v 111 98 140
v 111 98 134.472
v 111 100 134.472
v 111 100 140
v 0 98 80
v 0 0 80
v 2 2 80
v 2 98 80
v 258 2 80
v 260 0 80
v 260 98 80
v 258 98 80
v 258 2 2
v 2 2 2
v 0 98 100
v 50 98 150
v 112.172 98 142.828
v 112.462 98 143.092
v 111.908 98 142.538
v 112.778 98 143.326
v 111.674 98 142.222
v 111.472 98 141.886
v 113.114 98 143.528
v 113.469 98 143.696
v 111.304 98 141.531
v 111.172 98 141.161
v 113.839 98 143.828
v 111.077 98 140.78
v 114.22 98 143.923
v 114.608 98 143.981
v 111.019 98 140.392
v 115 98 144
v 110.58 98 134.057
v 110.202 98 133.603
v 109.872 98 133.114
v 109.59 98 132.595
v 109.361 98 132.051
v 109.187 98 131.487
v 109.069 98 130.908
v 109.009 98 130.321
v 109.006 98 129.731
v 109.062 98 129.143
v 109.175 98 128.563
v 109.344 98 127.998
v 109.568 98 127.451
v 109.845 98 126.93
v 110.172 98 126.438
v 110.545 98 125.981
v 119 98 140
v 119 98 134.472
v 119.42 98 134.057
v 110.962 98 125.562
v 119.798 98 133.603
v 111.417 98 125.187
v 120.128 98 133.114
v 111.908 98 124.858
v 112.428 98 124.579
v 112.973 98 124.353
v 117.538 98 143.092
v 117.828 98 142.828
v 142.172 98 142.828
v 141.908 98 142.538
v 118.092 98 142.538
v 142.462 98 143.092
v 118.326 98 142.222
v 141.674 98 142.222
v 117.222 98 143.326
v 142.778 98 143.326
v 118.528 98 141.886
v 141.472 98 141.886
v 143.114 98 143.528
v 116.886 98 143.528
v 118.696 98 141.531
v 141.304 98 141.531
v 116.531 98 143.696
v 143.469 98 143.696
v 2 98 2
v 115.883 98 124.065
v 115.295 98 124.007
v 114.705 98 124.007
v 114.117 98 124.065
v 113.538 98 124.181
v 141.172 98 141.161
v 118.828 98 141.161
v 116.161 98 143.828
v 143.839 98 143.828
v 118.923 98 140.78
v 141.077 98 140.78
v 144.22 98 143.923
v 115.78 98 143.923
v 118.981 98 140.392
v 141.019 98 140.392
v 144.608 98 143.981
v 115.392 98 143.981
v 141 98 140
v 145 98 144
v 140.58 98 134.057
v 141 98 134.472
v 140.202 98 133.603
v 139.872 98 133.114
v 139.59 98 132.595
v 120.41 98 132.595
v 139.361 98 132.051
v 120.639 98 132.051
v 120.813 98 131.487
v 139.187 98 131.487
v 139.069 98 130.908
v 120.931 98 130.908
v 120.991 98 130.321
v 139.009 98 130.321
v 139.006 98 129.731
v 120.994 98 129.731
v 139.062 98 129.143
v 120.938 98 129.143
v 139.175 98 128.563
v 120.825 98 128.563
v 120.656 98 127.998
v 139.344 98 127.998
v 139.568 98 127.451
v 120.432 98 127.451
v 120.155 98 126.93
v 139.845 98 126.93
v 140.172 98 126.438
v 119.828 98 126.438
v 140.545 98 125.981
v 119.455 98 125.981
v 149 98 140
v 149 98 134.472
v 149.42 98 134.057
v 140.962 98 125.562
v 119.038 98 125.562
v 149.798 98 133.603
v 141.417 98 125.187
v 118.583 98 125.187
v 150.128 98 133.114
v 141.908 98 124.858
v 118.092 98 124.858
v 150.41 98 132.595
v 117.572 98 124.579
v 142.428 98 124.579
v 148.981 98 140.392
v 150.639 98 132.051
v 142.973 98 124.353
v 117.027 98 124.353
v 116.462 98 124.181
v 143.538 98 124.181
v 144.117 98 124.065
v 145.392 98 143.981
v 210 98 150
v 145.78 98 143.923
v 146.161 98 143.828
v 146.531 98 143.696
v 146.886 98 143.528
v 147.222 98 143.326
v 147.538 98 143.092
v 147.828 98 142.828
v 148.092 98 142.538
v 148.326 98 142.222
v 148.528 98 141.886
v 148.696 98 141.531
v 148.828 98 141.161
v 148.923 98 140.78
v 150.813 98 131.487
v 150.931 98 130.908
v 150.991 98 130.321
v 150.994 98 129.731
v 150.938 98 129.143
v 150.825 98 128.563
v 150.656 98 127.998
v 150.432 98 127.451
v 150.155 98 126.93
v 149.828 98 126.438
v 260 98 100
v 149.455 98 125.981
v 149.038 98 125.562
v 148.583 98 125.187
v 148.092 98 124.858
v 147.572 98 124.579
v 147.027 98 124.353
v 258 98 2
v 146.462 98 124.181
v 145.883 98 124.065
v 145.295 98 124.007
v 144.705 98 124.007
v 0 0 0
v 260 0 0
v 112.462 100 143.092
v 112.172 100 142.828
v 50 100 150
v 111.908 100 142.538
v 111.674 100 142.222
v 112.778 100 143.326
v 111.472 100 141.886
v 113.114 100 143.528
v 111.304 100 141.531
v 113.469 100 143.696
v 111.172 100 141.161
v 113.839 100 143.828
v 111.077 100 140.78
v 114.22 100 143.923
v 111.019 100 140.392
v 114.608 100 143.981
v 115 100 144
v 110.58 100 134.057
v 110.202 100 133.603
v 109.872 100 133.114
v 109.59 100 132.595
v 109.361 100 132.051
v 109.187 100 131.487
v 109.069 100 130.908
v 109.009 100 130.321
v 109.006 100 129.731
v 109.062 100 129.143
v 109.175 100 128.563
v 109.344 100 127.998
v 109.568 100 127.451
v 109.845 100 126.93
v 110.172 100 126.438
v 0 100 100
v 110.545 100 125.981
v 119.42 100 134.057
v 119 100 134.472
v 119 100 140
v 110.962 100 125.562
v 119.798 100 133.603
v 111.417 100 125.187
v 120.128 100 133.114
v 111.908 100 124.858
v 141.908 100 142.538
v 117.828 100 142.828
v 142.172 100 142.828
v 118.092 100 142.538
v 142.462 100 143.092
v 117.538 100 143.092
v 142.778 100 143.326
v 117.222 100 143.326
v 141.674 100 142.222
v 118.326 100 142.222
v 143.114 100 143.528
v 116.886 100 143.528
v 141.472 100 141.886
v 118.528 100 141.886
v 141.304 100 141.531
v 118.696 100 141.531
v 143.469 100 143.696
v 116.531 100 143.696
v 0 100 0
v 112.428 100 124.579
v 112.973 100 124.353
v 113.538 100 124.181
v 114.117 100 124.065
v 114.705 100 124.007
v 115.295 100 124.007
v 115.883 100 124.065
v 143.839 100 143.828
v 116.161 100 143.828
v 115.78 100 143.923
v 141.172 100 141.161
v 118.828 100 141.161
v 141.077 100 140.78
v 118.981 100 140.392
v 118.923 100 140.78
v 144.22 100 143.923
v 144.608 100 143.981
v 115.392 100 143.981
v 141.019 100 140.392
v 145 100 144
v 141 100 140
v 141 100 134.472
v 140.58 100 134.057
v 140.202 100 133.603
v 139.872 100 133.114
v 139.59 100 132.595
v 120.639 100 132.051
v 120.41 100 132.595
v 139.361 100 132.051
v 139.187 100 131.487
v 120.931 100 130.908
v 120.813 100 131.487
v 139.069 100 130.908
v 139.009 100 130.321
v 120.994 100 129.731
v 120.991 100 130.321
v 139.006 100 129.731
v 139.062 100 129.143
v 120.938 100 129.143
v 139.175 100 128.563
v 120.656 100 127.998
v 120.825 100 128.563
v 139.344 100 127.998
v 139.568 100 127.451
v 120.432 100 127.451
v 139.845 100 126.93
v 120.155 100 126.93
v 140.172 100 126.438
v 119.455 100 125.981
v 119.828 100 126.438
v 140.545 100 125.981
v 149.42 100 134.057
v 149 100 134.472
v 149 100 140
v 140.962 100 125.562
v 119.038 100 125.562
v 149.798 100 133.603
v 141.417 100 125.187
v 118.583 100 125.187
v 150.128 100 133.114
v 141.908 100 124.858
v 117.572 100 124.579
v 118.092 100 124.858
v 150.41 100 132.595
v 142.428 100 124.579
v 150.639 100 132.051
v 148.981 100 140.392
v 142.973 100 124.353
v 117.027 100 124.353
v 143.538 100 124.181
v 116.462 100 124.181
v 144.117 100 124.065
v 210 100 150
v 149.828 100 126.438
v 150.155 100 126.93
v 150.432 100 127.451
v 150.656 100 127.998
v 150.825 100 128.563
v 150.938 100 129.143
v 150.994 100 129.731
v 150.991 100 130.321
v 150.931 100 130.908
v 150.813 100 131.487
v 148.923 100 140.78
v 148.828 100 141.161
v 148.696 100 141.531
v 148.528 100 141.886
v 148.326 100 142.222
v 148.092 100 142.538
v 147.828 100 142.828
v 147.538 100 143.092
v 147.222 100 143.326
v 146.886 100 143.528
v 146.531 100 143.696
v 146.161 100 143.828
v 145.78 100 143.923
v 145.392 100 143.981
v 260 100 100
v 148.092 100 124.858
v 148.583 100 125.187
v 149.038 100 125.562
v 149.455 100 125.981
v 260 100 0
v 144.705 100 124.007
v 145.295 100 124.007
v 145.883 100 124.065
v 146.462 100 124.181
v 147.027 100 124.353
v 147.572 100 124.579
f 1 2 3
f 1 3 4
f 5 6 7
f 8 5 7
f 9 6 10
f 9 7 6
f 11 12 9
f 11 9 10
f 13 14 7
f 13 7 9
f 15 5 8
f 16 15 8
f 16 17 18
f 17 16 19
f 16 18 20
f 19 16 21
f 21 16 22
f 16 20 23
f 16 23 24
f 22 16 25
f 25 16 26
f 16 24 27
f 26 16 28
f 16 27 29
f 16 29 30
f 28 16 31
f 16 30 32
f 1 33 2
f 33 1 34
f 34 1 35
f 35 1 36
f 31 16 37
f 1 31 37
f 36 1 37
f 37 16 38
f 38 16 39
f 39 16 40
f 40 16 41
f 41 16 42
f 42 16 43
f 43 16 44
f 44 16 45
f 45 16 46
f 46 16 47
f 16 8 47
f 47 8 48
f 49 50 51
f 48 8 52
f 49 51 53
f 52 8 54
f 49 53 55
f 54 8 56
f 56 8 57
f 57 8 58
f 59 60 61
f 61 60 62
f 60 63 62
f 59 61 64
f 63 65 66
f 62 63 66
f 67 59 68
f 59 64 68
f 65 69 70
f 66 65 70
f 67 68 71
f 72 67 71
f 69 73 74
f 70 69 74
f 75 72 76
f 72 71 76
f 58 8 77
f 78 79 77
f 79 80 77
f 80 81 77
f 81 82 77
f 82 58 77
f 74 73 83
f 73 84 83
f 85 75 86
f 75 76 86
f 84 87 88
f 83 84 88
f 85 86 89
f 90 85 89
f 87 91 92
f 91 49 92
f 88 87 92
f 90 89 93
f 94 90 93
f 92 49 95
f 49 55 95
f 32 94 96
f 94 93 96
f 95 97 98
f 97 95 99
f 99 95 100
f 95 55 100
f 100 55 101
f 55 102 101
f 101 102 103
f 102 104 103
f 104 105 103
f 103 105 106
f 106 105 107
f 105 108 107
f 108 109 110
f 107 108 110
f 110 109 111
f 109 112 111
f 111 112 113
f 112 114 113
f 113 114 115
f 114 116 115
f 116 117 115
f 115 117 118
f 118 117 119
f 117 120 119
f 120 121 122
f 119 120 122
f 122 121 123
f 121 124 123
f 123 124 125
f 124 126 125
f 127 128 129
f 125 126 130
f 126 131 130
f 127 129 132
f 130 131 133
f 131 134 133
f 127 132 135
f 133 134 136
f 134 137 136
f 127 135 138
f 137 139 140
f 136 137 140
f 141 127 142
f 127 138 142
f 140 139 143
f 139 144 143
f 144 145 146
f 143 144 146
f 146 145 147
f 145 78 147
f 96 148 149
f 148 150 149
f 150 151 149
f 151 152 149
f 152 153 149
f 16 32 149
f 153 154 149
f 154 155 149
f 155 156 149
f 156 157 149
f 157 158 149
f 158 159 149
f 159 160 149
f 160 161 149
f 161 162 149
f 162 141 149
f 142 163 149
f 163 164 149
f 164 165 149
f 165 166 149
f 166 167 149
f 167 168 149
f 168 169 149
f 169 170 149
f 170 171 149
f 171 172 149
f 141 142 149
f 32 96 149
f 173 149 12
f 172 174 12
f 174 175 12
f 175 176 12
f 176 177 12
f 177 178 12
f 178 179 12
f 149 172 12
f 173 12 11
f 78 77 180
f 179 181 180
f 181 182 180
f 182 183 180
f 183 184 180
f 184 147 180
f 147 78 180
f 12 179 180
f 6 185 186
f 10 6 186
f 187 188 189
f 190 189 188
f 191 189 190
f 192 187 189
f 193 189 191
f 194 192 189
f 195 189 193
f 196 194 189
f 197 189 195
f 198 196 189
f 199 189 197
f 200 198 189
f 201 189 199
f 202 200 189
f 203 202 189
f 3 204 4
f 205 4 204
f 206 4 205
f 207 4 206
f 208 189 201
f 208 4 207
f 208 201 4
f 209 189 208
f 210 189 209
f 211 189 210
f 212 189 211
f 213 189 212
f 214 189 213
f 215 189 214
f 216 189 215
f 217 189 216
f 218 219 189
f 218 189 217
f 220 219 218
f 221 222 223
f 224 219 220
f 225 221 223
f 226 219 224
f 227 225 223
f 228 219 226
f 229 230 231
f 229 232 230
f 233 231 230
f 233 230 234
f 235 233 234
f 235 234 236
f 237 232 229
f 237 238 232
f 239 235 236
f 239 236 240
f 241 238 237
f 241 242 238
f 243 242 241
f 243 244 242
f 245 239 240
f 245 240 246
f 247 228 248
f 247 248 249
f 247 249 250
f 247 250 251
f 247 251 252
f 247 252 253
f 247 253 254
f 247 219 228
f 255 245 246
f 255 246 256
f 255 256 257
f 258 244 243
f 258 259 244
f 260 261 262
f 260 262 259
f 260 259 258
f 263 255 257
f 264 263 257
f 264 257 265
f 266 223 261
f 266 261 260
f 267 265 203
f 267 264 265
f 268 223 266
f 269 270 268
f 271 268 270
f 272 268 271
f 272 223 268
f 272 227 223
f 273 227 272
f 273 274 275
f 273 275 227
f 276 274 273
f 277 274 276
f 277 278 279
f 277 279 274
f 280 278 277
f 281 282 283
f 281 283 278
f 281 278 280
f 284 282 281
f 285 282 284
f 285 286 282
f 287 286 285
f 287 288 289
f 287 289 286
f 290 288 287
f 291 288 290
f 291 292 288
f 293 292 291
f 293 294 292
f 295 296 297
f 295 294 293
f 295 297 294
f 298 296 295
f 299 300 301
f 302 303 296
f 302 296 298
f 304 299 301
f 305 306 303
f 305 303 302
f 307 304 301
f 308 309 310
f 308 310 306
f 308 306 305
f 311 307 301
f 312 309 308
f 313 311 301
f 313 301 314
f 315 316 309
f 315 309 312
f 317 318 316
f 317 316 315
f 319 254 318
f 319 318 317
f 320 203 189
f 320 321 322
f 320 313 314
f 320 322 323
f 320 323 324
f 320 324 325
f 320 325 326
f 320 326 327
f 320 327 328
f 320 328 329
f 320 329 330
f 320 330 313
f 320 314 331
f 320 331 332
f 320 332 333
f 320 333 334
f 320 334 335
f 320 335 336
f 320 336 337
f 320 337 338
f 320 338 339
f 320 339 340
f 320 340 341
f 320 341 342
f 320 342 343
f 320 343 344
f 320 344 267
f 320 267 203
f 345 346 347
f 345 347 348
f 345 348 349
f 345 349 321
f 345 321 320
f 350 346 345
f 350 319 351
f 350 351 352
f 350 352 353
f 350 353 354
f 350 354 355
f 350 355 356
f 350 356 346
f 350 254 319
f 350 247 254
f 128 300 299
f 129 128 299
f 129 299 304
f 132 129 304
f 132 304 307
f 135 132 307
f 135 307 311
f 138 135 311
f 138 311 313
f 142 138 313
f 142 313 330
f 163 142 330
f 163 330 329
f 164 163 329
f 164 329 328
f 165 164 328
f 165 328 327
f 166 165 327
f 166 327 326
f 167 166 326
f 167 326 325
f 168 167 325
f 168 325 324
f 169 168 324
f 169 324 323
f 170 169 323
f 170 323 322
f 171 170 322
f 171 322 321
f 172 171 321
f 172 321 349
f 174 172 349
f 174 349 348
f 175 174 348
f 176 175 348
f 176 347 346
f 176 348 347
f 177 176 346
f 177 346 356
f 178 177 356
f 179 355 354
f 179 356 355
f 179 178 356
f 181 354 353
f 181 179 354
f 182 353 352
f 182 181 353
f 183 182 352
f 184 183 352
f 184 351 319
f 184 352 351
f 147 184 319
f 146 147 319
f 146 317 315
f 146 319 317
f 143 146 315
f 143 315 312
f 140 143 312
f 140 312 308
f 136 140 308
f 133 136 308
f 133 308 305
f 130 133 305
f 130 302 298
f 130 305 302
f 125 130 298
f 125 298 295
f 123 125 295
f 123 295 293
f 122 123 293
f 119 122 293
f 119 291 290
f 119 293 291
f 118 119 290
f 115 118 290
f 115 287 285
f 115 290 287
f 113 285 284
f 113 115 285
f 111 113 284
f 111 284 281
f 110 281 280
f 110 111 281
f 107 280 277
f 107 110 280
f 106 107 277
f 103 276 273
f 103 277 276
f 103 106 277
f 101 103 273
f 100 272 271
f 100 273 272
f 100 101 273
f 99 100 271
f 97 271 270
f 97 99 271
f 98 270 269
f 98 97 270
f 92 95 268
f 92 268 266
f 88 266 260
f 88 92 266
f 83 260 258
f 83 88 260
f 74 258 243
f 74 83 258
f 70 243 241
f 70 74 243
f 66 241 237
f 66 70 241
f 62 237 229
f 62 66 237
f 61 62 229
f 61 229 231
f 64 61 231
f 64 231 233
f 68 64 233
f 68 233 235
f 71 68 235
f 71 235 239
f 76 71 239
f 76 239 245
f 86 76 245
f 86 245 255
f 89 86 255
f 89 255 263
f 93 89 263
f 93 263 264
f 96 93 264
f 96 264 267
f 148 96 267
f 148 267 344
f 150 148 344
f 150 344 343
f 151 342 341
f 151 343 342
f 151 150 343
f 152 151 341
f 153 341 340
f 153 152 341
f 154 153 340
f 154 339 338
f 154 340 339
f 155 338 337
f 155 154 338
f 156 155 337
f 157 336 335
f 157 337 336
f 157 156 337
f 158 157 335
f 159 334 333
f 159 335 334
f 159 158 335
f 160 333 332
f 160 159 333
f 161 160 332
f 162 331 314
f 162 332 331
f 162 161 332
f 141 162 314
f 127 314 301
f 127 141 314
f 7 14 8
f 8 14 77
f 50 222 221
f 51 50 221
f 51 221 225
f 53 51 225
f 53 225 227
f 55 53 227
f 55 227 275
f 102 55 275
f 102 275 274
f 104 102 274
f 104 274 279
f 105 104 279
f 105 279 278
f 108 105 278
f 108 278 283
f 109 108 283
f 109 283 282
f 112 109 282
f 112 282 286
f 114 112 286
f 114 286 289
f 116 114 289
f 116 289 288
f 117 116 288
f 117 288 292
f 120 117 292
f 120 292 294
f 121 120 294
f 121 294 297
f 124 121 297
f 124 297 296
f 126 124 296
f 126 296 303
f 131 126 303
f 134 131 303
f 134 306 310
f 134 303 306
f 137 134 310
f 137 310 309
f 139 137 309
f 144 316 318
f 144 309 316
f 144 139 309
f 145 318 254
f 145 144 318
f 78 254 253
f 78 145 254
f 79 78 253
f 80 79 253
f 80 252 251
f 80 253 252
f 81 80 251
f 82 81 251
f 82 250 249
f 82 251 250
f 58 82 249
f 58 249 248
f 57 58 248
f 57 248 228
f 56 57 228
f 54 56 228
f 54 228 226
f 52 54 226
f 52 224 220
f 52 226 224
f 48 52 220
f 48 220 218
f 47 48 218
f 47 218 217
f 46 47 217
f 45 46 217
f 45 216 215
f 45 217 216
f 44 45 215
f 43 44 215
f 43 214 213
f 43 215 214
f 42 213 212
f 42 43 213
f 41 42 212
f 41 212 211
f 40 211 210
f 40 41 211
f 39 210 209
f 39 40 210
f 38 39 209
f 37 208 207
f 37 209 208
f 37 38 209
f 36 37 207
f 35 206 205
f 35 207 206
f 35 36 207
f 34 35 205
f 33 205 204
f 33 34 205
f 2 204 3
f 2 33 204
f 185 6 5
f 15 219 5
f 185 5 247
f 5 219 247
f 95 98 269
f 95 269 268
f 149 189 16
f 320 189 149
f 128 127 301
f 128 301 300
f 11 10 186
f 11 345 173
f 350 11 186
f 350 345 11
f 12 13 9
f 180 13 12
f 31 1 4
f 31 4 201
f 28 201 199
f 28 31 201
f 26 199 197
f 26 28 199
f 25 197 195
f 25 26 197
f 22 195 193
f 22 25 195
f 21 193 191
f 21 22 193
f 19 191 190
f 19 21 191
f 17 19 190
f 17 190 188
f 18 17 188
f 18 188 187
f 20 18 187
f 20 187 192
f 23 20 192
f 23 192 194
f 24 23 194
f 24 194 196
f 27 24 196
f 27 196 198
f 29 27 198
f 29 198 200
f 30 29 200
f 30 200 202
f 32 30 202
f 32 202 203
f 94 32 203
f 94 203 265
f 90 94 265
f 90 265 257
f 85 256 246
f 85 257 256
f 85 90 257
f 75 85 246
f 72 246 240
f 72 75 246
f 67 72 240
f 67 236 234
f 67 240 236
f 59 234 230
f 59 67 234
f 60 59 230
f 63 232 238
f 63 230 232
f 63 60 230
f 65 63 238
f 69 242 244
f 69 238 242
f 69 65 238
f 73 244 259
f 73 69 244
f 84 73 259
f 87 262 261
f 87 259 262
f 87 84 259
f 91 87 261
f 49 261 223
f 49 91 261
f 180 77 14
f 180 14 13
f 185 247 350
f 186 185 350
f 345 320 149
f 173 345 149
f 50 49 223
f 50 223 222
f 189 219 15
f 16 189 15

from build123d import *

# Parameters (mm, degrees)
SKETCH_1_W          = 260
SKETCH_1_H          = 100
EXTRUDE_1_DEPTH     = 80
SHELL_1_T           = -2
SKETCH_4_W          = 260
SKETCH_4_H          = 70
EXTRUDE_1_2_DEPTH   = 2
CUT_EXTRUDE_3_DEPTH = 10
CHAMFER_1_SIZE      = 50


with BuildPart() as part:
    # 草图1 → Extrude 1 (new body)
    with BuildSketch(Plane.XY):
        with Locations((130, 50)):
            Rectangle(SKETCH_1_W, SKETCH_1_H)
    extrude(amount=EXTRUDE_1_DEPTH)

    # 抽壳1
    shell_1_openings = [part.faces().sort_by_distance(p)[0] for p in [
        (130, 50, 80),
    ]]
    offset(amount=SHELL_1_T, openings=shell_1_openings, kind=Kind.INTERSECTION)

    # 草图4 → Extrude 1 2 (add)
    with BuildSketch(Plane(origin=(0, 100, 0), x_dir=(1, 0, 0), z_dir=(0, 1, 0))):
        with Locations((130, -115)):
            Rectangle(SKETCH_4_W, SKETCH_4_H)
    extrude(amount=-EXTRUDE_1_2_DEPTH)

    # 草图5 → 切除-拉伸3 (cut)
    with BuildSketch(Plane(origin=(0, 98, 0), x_dir=(-1, 0, 0), z_dir=(0, -1, 0))):
        with BuildLine():
            Line((-119, -140), (-119, -134.472135955))
            ThreePointArc((-119, -134.472135955), (-115, -124), (-111, -134.472135955))
            Line((-111, -134.472135955), (-111, -140))
            ThreePointArc((-111, -140), (-115, -144), (-119, -140))
        make_face()
        with BuildLine():
            Line((-149, -140), (-149, -134.472135955))
            ThreePointArc((-149, -134.472135955), (-145, -124), (-141, -134.472135955))
            Line((-141, -134.472135955), (-141, -140))
            ThreePointArc((-141, -140), (-145, -144), (-149, -140))
        make_face()
    extrude(amount=-CUT_EXTRUDE_3_DEPTH, mode=Mode.SUBTRACT)

    # 倒角1
    chamfer_1_edges = [part.edges().sort_by_distance(p)[0] for p in [
        (260, 99, 150),
        (0, 99, 150),
    ]]
    chamfer(chamfer_1_edges, length=CHAMFER_1_SIZE)


solid = part.part
